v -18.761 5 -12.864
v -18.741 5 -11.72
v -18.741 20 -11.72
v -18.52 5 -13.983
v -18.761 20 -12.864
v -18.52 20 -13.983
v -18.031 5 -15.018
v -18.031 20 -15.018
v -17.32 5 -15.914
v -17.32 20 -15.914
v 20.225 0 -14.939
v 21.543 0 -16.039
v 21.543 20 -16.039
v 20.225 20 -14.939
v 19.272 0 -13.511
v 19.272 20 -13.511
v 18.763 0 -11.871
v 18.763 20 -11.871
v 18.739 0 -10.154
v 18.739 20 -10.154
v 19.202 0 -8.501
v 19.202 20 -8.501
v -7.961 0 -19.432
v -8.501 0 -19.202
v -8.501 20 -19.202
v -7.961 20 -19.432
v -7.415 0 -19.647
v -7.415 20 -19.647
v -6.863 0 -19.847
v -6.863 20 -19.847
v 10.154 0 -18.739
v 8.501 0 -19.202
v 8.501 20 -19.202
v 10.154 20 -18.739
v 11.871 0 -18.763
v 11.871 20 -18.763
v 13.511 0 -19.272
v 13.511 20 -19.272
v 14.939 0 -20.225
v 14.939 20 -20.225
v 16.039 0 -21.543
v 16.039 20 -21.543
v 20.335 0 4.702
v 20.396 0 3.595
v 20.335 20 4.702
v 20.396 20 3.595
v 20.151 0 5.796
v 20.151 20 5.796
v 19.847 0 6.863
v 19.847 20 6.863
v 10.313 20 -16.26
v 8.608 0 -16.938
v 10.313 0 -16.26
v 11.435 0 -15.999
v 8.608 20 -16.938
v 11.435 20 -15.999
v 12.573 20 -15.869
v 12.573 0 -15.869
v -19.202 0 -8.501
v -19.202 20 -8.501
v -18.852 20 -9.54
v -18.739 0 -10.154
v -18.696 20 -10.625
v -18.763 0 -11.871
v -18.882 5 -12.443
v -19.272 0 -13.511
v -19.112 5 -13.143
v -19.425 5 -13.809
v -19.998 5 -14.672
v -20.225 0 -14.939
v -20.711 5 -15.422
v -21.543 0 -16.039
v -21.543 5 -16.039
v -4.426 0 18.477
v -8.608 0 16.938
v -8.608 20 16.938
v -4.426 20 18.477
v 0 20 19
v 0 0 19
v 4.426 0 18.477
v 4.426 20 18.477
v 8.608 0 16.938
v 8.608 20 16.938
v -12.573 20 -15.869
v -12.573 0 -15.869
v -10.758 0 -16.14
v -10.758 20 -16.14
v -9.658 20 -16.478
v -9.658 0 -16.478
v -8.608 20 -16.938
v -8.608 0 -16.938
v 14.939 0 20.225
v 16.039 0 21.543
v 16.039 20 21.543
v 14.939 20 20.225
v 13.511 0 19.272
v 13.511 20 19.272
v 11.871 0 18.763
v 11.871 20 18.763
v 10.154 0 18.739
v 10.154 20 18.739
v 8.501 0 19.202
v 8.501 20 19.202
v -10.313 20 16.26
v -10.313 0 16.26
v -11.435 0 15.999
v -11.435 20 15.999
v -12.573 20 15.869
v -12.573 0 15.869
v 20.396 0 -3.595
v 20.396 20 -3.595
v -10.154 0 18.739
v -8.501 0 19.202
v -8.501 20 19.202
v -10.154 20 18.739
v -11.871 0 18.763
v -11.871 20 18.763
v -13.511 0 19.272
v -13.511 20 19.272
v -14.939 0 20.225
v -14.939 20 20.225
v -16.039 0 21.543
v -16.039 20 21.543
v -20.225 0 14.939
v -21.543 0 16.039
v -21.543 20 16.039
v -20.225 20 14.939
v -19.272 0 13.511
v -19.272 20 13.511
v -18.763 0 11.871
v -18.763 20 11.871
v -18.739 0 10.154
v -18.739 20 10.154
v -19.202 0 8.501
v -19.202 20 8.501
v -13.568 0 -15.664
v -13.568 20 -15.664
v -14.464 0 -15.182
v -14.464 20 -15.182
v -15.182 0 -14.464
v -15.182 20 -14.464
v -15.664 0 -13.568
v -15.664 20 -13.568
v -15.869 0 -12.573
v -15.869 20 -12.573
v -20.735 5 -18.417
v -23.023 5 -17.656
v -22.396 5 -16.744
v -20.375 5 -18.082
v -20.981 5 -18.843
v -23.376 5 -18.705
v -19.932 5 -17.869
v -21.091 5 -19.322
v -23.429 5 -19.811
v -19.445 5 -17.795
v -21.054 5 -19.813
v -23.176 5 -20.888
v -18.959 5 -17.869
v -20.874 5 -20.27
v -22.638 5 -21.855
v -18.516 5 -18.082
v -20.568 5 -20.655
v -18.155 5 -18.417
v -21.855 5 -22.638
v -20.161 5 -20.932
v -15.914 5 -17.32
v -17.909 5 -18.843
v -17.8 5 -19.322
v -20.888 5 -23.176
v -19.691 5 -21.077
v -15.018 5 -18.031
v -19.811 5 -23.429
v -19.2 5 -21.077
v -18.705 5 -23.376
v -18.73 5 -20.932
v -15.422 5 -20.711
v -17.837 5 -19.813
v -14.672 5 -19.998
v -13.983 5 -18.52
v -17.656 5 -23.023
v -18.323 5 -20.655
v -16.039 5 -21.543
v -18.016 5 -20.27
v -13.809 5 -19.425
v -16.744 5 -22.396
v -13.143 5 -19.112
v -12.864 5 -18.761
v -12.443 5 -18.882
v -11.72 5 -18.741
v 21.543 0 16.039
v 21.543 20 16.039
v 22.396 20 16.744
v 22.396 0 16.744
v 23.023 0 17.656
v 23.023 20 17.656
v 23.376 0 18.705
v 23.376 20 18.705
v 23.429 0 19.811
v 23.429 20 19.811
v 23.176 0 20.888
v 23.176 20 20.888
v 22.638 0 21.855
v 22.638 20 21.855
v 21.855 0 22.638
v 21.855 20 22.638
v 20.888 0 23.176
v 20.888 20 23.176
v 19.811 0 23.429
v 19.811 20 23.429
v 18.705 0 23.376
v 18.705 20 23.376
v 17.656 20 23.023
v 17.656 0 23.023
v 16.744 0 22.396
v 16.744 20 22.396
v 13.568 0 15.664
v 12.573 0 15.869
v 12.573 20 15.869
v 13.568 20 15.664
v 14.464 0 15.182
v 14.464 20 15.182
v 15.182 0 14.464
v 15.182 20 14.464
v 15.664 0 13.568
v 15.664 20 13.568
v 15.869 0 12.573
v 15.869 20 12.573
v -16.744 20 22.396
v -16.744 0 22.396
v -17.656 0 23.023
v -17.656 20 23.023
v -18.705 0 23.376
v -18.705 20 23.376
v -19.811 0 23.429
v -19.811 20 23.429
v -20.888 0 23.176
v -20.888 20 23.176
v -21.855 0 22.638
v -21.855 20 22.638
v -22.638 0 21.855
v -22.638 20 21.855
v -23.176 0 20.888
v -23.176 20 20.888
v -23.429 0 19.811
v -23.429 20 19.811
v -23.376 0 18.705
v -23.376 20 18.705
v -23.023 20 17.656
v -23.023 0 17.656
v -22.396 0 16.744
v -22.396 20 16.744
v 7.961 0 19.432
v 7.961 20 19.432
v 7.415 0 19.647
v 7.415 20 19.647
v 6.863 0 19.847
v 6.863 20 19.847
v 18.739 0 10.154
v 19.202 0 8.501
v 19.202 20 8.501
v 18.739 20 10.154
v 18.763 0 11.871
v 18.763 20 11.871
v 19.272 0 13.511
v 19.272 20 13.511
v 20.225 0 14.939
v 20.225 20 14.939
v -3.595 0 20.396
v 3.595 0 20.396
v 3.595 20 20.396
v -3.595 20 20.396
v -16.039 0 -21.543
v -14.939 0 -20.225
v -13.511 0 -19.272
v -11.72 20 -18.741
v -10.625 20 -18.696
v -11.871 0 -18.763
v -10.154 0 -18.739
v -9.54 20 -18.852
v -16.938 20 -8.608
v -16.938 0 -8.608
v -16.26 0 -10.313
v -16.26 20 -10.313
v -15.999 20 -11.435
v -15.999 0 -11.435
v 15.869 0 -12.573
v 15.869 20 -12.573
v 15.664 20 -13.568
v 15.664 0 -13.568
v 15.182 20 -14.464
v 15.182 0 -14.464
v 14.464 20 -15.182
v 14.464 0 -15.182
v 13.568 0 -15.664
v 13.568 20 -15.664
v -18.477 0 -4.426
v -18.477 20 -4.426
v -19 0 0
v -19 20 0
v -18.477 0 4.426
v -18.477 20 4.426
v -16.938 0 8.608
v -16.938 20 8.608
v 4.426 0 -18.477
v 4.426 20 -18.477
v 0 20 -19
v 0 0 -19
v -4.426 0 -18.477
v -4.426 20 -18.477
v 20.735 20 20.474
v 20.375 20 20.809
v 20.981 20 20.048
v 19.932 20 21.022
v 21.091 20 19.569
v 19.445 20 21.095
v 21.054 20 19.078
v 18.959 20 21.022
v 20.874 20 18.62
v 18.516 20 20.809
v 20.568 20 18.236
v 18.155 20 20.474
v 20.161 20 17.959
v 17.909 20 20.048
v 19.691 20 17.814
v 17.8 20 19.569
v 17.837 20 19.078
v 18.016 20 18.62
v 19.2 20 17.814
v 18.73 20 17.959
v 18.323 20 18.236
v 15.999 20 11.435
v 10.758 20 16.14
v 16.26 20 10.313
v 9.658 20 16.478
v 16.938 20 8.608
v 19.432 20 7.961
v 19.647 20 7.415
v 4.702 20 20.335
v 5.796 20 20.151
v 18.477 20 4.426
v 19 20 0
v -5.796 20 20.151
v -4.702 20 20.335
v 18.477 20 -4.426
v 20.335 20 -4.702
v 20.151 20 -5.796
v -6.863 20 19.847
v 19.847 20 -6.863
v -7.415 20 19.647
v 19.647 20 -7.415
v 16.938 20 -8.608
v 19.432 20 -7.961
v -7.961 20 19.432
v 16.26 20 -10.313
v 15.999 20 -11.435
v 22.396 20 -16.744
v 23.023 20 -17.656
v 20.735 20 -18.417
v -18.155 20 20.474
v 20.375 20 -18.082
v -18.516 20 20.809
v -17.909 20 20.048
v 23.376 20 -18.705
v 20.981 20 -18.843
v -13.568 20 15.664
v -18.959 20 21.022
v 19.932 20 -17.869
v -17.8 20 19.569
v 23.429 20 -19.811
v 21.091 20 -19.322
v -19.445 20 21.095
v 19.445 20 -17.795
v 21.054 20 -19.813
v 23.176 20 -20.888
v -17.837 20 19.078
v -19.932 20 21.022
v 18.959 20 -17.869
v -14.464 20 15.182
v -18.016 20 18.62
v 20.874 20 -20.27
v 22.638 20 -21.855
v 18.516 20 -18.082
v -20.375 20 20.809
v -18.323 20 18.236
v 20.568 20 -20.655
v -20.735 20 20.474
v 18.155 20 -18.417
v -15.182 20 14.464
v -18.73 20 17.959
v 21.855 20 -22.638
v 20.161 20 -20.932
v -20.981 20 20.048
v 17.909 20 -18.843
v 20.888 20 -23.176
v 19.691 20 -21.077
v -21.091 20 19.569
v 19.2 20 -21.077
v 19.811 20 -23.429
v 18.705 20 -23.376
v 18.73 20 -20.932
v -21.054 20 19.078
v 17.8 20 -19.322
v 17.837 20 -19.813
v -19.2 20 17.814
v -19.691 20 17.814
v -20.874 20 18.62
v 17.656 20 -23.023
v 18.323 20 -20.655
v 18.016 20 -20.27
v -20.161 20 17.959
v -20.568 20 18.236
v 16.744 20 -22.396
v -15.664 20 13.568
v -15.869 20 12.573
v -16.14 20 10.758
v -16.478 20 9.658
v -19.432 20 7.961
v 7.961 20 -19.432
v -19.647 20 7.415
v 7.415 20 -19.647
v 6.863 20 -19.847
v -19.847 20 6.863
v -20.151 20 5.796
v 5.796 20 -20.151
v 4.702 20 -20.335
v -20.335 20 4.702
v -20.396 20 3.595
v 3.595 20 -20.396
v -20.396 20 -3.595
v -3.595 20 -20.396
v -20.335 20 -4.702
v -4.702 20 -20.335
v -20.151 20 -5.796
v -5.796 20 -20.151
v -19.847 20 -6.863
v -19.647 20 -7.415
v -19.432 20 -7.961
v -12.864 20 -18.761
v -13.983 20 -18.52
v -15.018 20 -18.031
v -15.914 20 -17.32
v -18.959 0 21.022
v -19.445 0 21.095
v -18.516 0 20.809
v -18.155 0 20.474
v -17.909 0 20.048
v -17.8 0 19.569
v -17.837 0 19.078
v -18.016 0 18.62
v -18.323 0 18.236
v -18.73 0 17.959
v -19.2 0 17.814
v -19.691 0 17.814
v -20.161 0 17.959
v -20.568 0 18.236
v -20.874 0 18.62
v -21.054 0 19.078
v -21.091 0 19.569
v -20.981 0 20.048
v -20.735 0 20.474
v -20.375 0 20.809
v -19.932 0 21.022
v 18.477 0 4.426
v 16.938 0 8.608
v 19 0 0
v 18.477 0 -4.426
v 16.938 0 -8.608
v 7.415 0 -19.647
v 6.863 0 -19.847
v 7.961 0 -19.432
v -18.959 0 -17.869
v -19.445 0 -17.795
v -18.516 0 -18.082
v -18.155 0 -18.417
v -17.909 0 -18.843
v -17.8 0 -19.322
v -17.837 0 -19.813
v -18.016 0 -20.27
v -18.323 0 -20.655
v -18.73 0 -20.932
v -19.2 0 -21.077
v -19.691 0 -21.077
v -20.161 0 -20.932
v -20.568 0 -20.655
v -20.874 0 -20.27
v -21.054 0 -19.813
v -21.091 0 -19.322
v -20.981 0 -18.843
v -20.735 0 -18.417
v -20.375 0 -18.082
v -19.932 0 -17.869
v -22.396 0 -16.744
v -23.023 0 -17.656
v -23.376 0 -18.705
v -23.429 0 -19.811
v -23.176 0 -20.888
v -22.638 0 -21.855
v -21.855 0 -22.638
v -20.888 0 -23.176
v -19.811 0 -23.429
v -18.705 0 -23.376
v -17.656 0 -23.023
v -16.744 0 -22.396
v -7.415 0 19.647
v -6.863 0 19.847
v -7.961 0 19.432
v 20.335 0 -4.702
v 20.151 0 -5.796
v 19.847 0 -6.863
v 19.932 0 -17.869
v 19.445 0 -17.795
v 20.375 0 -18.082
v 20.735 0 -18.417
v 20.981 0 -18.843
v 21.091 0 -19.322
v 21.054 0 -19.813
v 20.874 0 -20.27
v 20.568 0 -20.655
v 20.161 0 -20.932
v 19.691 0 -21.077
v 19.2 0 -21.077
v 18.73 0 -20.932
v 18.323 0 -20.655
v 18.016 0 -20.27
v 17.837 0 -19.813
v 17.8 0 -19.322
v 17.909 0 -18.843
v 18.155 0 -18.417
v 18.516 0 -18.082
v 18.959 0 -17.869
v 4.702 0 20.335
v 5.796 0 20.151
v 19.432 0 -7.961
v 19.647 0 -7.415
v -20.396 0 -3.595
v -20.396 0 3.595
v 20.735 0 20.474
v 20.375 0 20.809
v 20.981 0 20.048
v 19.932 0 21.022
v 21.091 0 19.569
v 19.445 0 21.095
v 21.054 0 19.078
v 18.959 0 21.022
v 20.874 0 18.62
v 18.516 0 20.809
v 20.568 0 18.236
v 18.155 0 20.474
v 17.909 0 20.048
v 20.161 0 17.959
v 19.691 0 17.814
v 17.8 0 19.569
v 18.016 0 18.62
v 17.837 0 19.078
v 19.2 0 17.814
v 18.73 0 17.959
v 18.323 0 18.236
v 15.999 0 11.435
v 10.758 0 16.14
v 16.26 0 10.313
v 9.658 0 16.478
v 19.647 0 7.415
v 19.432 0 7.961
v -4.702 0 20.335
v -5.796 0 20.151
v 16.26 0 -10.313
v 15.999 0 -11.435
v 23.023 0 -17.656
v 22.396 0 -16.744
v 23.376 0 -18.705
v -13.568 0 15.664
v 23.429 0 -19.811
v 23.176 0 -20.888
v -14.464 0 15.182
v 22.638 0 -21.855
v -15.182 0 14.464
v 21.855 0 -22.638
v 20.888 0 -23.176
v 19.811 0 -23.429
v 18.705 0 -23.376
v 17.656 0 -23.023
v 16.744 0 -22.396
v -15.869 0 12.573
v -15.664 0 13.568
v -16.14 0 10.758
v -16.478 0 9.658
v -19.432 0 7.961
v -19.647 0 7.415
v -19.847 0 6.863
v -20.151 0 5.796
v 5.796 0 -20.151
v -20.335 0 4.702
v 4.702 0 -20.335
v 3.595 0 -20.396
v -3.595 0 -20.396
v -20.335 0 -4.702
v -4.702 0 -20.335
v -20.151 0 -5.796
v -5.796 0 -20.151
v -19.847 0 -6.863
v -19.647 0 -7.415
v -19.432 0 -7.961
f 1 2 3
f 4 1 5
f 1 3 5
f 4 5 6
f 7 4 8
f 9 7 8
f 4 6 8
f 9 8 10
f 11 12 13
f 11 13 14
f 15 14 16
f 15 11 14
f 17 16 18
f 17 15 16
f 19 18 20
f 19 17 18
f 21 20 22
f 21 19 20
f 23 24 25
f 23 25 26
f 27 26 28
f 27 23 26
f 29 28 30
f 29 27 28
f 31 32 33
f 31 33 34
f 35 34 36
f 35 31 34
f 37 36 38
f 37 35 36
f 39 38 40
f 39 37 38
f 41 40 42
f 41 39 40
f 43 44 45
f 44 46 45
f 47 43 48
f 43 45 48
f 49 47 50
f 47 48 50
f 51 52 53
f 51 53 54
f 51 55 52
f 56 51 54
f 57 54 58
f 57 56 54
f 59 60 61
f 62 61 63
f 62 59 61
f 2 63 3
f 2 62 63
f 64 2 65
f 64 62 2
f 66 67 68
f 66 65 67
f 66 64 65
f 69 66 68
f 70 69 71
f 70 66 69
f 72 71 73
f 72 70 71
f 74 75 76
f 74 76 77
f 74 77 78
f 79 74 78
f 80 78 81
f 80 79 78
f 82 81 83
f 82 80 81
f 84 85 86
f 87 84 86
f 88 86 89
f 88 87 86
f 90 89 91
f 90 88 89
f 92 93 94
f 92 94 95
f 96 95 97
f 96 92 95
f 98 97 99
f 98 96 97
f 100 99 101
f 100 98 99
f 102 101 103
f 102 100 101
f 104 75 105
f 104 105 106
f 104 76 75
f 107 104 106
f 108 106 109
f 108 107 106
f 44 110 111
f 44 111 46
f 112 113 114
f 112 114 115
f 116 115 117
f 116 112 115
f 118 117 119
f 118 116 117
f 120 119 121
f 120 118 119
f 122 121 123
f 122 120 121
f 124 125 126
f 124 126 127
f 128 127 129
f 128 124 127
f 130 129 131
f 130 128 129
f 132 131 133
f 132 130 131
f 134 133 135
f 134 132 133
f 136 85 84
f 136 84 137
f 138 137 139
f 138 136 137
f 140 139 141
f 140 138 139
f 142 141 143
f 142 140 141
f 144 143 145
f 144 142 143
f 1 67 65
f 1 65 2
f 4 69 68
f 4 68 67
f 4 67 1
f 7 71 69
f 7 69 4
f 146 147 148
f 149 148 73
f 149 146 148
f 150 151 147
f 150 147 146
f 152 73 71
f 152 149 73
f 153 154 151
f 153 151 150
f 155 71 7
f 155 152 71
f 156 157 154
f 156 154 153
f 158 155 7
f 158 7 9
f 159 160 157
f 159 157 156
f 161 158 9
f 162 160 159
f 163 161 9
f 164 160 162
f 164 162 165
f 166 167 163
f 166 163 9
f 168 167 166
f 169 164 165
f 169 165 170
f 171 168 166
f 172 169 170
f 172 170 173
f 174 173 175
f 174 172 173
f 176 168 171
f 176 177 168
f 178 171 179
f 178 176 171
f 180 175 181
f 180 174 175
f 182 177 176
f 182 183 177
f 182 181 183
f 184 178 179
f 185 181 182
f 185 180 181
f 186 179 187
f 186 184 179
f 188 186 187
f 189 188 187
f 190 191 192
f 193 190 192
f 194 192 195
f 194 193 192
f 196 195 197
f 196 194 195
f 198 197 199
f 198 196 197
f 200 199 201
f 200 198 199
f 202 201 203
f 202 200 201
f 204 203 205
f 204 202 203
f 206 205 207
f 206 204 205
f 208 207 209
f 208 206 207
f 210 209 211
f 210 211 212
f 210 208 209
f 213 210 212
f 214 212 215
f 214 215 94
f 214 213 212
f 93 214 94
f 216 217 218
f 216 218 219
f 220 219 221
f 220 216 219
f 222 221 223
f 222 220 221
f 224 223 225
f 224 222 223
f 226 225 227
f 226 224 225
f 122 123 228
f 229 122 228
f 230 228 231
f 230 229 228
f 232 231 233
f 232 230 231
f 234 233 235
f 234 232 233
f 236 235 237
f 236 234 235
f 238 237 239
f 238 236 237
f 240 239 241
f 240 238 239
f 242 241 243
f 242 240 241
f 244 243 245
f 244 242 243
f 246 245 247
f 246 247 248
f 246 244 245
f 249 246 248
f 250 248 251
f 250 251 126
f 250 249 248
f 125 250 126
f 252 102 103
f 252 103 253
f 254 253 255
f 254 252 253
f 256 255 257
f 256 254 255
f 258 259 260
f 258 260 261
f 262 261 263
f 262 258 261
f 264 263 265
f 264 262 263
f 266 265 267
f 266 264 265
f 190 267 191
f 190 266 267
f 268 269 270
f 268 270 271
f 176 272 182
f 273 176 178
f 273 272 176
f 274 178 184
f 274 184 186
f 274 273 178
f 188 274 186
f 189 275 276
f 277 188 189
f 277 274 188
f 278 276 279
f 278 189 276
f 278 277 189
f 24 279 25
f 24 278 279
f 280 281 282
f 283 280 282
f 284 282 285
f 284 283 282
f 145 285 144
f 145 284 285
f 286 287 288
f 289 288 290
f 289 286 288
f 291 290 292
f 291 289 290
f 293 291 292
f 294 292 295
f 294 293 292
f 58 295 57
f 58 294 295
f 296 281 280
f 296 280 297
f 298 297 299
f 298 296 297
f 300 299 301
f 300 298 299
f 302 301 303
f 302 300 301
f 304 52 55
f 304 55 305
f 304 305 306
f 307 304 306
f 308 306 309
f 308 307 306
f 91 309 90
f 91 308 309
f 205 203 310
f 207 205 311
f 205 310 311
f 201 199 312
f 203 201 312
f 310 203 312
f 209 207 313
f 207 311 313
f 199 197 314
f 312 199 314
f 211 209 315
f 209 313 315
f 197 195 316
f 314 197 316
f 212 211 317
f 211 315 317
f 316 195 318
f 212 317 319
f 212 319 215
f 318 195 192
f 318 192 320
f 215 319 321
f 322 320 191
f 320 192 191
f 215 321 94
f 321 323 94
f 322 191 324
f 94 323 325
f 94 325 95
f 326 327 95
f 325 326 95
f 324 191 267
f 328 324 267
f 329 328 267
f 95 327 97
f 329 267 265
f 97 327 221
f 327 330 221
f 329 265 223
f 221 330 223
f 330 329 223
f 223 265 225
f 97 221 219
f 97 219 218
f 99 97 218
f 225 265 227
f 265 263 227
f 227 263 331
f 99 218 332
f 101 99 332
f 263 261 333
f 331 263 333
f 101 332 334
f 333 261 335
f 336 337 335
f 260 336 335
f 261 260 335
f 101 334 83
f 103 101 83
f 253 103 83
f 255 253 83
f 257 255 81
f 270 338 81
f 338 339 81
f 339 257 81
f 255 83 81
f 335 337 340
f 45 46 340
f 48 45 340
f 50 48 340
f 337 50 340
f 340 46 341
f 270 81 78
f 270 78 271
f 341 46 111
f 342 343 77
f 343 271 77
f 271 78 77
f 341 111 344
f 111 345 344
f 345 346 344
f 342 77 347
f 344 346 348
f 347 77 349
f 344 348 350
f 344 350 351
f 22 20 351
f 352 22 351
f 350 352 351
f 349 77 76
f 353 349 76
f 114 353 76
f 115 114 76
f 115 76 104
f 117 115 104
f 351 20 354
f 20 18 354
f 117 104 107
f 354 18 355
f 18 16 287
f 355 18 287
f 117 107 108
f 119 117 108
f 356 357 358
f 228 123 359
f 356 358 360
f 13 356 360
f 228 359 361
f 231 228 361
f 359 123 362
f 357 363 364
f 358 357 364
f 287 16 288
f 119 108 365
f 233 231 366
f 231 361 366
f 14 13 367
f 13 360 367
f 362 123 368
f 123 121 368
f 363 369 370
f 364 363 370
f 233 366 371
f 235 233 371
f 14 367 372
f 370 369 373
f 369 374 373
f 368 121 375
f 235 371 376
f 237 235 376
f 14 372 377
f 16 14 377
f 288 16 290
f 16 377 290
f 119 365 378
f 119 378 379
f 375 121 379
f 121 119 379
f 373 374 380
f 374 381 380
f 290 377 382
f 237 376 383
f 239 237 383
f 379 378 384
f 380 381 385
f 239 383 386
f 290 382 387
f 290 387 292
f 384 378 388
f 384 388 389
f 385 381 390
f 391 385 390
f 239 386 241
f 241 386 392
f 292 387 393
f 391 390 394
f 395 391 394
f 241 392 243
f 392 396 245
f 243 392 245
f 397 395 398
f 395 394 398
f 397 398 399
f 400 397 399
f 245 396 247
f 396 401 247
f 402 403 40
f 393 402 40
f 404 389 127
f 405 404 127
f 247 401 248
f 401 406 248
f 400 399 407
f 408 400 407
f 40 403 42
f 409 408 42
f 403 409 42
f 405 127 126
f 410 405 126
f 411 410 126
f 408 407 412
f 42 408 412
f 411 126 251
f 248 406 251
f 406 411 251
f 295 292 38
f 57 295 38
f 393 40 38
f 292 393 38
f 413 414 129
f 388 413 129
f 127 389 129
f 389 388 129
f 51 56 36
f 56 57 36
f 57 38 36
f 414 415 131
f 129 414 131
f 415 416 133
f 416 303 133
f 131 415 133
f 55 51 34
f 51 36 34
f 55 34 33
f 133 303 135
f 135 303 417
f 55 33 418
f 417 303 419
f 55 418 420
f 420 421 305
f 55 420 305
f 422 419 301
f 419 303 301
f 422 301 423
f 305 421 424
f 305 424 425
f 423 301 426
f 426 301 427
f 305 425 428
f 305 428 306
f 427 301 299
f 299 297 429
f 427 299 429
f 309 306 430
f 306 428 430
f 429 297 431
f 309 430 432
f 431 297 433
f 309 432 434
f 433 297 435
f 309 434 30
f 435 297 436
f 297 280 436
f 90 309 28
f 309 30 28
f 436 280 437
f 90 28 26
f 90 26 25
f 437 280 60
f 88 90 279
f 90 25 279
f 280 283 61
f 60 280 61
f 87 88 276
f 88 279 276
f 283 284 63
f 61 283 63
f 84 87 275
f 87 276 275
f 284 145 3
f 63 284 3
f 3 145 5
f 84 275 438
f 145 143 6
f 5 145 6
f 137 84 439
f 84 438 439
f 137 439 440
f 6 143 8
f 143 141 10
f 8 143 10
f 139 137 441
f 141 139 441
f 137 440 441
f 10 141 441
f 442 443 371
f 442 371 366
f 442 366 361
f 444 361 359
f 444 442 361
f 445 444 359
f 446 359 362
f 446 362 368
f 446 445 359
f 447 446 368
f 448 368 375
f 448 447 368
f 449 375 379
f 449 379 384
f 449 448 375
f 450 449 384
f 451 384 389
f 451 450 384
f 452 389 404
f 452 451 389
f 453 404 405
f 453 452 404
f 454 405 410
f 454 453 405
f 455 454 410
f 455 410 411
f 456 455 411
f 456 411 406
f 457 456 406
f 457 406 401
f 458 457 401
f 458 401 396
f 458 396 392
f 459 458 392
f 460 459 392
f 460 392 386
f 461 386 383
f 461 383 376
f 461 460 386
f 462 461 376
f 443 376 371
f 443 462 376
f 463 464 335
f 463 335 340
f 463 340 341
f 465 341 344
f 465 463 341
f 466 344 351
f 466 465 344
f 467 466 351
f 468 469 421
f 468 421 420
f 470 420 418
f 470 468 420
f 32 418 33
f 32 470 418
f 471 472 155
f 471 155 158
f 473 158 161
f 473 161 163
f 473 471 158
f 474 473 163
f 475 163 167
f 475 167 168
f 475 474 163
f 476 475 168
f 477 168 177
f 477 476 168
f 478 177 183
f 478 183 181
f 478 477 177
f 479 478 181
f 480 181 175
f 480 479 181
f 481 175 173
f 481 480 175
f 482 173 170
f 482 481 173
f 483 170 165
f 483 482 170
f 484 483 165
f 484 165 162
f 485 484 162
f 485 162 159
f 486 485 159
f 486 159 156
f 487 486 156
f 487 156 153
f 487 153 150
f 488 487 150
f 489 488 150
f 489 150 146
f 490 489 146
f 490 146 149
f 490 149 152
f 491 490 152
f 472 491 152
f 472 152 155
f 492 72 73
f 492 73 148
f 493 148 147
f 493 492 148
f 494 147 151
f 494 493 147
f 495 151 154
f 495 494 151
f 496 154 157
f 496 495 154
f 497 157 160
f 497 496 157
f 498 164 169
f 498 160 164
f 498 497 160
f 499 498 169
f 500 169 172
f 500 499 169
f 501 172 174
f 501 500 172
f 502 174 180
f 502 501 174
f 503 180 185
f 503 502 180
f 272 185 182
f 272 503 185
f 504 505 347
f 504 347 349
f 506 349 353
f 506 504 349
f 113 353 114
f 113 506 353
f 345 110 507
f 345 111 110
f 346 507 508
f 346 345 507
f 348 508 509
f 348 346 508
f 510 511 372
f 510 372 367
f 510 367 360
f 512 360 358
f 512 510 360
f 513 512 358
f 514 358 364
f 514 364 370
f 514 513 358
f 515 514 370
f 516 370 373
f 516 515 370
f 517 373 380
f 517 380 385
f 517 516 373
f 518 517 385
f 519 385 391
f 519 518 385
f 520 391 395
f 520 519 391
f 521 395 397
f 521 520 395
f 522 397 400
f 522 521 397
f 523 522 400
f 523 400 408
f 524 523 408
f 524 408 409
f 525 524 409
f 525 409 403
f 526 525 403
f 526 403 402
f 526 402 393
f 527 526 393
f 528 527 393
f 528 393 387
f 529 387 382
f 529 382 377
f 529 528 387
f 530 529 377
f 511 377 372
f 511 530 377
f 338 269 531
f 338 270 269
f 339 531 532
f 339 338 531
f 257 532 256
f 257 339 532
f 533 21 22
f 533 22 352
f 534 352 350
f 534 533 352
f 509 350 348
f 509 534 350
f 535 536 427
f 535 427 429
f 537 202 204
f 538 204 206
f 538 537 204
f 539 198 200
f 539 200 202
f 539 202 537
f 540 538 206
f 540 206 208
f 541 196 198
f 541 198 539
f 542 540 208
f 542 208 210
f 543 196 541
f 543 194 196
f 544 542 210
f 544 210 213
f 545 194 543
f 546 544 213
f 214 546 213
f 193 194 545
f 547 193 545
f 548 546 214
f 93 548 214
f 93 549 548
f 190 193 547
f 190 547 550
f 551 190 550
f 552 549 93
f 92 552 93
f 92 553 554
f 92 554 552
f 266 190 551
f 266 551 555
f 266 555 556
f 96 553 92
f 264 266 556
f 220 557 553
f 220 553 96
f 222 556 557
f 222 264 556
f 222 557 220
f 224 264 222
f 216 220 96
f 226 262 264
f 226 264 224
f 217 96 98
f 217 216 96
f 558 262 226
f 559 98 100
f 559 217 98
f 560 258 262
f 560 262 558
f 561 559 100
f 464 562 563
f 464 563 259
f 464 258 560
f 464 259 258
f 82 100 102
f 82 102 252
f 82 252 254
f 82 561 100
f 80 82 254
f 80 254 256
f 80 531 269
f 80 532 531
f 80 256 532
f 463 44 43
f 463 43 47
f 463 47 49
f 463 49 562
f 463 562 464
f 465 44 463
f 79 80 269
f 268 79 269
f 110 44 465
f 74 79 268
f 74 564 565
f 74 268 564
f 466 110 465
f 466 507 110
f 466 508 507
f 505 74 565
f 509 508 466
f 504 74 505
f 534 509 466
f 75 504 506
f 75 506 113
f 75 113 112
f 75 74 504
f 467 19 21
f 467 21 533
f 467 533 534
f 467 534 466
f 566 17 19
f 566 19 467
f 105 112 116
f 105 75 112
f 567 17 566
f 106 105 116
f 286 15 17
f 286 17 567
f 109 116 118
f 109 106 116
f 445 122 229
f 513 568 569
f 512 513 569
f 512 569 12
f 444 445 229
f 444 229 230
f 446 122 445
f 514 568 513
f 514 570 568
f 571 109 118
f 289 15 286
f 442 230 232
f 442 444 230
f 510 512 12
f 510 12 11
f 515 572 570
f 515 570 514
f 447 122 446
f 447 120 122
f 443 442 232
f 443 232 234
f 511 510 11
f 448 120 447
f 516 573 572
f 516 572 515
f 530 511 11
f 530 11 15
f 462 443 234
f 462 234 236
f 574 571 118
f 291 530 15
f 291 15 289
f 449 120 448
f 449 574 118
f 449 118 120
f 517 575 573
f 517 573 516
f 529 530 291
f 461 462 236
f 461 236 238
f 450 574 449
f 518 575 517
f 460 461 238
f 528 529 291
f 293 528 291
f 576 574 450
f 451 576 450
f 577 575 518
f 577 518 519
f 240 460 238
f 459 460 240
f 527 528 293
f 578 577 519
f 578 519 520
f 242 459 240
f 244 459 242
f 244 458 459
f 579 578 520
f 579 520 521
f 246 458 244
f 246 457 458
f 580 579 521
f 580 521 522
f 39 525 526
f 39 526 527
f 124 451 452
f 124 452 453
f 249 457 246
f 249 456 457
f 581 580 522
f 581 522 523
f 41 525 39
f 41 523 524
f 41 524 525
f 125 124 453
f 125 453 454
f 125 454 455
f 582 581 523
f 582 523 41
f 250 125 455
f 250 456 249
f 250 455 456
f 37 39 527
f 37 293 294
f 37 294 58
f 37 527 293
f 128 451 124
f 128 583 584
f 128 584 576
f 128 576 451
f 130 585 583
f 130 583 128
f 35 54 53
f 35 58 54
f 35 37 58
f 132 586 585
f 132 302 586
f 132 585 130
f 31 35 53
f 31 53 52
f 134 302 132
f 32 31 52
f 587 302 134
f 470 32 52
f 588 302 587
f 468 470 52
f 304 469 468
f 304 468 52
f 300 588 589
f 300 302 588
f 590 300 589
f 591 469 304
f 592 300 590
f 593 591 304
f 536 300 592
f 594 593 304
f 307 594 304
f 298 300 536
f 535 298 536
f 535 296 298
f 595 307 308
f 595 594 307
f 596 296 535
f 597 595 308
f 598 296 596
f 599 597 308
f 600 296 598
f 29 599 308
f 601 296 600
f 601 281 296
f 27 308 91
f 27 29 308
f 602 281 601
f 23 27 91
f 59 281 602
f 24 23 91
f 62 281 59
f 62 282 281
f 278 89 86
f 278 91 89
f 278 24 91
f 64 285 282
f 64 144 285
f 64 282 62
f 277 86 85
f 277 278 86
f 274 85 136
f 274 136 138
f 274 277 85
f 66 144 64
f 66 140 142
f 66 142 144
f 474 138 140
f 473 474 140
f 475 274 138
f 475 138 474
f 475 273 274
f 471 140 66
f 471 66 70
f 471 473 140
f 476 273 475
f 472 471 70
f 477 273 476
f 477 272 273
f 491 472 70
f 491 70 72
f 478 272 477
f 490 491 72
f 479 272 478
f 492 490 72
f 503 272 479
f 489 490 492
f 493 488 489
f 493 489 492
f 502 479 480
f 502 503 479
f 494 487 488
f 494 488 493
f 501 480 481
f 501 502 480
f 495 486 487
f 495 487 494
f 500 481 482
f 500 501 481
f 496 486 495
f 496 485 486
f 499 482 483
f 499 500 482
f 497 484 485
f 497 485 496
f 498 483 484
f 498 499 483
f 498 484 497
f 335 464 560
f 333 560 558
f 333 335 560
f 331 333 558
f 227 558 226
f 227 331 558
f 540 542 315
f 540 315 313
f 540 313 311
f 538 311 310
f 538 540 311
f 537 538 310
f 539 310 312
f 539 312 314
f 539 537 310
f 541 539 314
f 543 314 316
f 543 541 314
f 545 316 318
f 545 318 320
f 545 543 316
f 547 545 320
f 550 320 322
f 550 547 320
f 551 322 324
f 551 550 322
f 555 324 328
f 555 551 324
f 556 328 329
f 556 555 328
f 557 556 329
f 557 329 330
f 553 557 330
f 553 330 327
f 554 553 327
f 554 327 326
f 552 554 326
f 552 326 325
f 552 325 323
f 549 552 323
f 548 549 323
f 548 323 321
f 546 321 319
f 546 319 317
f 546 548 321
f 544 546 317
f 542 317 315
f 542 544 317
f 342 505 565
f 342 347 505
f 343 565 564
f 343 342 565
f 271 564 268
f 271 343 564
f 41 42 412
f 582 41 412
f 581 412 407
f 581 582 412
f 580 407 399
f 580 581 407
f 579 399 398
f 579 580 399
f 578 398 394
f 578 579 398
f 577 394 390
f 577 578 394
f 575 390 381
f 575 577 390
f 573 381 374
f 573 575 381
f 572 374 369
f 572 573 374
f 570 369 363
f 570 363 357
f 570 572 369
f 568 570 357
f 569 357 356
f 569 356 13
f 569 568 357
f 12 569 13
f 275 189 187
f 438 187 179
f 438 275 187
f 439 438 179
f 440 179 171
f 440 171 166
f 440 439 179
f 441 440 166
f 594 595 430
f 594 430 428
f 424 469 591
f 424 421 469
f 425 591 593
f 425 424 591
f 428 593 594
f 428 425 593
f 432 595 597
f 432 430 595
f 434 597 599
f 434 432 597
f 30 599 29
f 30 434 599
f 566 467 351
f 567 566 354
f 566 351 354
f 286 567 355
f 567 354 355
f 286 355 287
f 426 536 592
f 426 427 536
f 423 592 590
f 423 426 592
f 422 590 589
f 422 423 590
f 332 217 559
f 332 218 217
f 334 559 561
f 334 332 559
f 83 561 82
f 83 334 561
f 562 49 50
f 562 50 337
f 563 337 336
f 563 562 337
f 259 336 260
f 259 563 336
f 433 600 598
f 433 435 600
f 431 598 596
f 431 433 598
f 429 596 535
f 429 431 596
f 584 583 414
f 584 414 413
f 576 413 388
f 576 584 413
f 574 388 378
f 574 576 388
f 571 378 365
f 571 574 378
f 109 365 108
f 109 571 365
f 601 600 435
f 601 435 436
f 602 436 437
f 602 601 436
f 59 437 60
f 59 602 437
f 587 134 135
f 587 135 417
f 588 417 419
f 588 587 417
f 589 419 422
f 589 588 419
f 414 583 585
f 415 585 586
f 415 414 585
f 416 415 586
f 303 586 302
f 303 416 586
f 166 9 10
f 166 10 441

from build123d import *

# Parameters (mm, degrees)
SKETCH_1_R          = 1.65
EXTRUDE_1_DEPTH     = 20
CUT_EXTRUDE_START   = -15
SKETCH_4_R          = 1.65
CUT_EXTRUDE_1_DEPTH = 15
FILLET_1_R          = 10
FILLET_2_R          = 5


with BuildPart() as part:
    # ｽｹｯﾁ1 → ﾎﾞｽ - 押し出し1 (new body)
    with BuildSketch(Plane(origin=(0, 0, 0), x_dir=(1, 0, 0), z_dir=(0, 1, 0))):
        with BuildLine():
            Line((20.396078054, 5), (20.396078054, -5))
            ThreePointArc((20.396078054, -5), (19.876430019, -6.776985295), (19.202290705, -8.501295883))
            ThreePointArc((19.202290705, -8.501295883), (18.958497792, -12.709351685), (21.542725681, -16.039356915))
            ThreePointArc((21.542725681, -16.039356915), (22.273863607, -22.273863607), (16.039356915, -21.542725681))
            ThreePointArc((16.039356915, -21.542725681), (12.709351685, -18.958497792), (8.501295883, -19.202290705))
            ThreePointArc((8.501295883, -19.202290705), (6.776985295, -19.876430019), (5, -20.396078054))
            Line((5, -20.396078054), (-5, -20.396078054))
            ThreePointArc((-5, -20.396078054), (-6.776985295, -19.876430019), (-8.501295883, -19.202290705))
            ThreePointArc((-8.501295883, -19.202290705), (-12.709351685, -18.958497792), (-16.039356915, -21.542725681))
            ThreePointArc((-16.039356915, -21.542725681), (-22.273863607, -22.273863607), (-21.542725681, -16.039356915))
            ThreePointArc((-21.542725681, -16.039356915), (-18.958497792, -12.709351685), (-19.202290705, -8.501295883))
            ThreePointArc((-19.202290705, -8.501295883), (-19.876430019, -6.776985295), (-20.396078054, -5))
            Line((-20.396078054, -5), (-20.396078054, 5))
            ThreePointArc((-20.396078054, 5), (-19.876430019, 6.776985295), (-19.202290705, 8.501295883))
            ThreePointArc((-19.202290705, 8.501295883), (-18.958497792, 12.709351685), (-21.542725681, 16.039356915))
            ThreePointArc((-21.542725681, 16.039356915), (-22.273863607, 22.273863607), (-16.039356915, 21.542725681))
            ThreePointArc((-16.039356915, 21.542725681), (-12.709351685, 18.958497792), (-8.501295883, 19.202290705))
            ThreePointArc((-8.501295883, 19.202290705), (-6.776985295, 19.876430019), (-5, 20.396078054))
            Line((-5, 20.396078054), (5, 20.396078054))
            ThreePointArc((5, 20.396078054), (6.776985295, 19.876430019), (8.501295883, 19.202290705))
            ThreePointArc((8.501295883, 19.202290705), (12.709351685, 18.958497792), (16.039356915, 21.542725681))
            ThreePointArc((16.039356915, 21.542725681), (22.273863607, 22.273863607), (21.542725681, 16.039356915))
            ThreePointArc((21.542725681, 16.039356915), (18.958497792, 12.709351685), (19.202290705, 8.501295883))
            ThreePointArc((19.202290705, 8.501295883), (19.876430019, 6.776985295), (20.396078054, 5))
        make_face()
        with Locations(Location((19.445436483, 19.445436483, 0), (0, 0, 270))):
            Circle(SKETCH_1_R, mode=Mode.SUBTRACT)
        with Locations(Location((19.445436483, -19.445436483, 0), (0, 0, 270))):
            Circle(SKETCH_1_R, mode=Mode.SUBTRACT)
        with Locations(Location((-19.445436483, -19.445436483, 0), (0, 0, 270))):
            Circle(SKETCH_1_R, mode=Mode.SUBTRACT)
        with Locations(Location((-19.445436483, 19.445436483, 0), (0, 0, 270))):
            Circle(SKETCH_1_R, mode=Mode.SUBTRACT)
        with BuildLine():
            ThreePointArc((10.911844504, 15.554152164), (0, 19), (-10.911844504, 15.554152164))
            ThreePointArc((-10.911844504, 15.554152164), (-14.849242405, 14.849242405), (-15.554152164, 10.911844504))
            ThreePointArc((-15.554152164, 10.911844504), (-19, 0), (-15.554152164, -10.911844504))
            ThreePointArc((-15.554152164, -10.911844504), (-14.849242405, -14.849242405), (-10.911844504, -15.554152164))
            ThreePointArc((-10.911844504, -15.554152164), (0, -19), (10.911844504, -15.554152164))
            ThreePointArc((10.911844504, -15.554152164), (14.849242405, -14.849242405), (15.554152164, -10.911844504))
            ThreePointArc((15.554152164, -10.911844504), (19, 0), (15.554152164, 10.911844504))
            ThreePointArc((15.554152164, 10.911844504), (14.849242405, 14.849242405), (10.911844504, 15.554152164))
        make_face(mode=Mode.SUBTRACT)
    extrude(amount=EXTRUDE_1_DEPTH)

    # ｽｹｯﾁ4 → ｶｯﾄ - 押し出し1 (cut)
    # profile 1 of 3: a face of its own
    with BuildSketch(Plane(origin=(0, 20, 0), x_dir=(1, 0, 0), z_dir=(0, 1, 0)).offset(CUT_EXTRUDE_START)):
        with BuildLine():
            ThreePointArc((-21.542725681, 16.039356915), (-20.338354704, 15.06240992), (-19.424600386, 13.80941833))
            Line((-19.424600386, 13.80941833), (-16.617009355, 16.617009361))
            ThreePointArc((-16.617009355, 16.617009361), (-18.979538151, 15.472661792), (-21.542725681, 16.039356915))
        make_face()
    # profile 2 of 3: a face of its own
    with BuildSketch(Plane(origin=(0, 20, 0), x_dir=(1, 0, 0), z_dir=(0, 1, 0)).offset(CUT_EXTRUDE_START)):
        with BuildLine():
            ThreePointArc((-21.542725681, 16.039356915), (-18.979538151, 15.472661792), (-16.617009355, 16.617009361))
            ThreePointArc((-16.617009355, 16.617009361), (-15.749918352, 17.914702755), (-15.445436483, 19.445436483))
            ThreePointArc((-15.445436483, 19.445436483), (-15.596779686, 20.535317607), (-16.039356915, 21.542725681))
            ThreePointArc((-16.039356915, 21.542725681), (-22.273863607, 22.273863607), (-21.542725681, 16.039356915))
        make_face()
        with Locations(Location((-19.445436483, 19.445436483, 0), (0, 0, 270))):
            Circle(SKETCH_4_R, mode=Mode.SUBTRACT)
    # profile 3 of 3: a face of its own
    with BuildSketch(Plane(origin=(0, 20, 0), x_dir=(1, 0, 0), z_dir=(0, 1, 0)).offset(CUT_EXTRUDE_START)):
        with BuildLine():
            ThreePointArc((-15.445436483, 19.445436483), (-15.749918352, 17.914702755), (-16.617009355, 16.617009361))
            Line((-16.617009355, 16.617009361), (-13.80941833, 19.424600386))
            ThreePointArc((-13.80941833, 19.424600386), (-15.06240992, 20.338354704), (-16.039356915, 21.542725681))
            ThreePointArc((-16.039356915, 21.542725681), (-15.596779686, 20.535317607), (-15.445436483, 19.445436483))
        make_face()
    extrude(amount=CUT_EXTRUDE_1_DEPTH, mode=Mode.SUBTRACT)

    # ﾌｨﾚｯﾄ1
    fillet_1_edges = [part.edges().sort_by_distance(p)[0] for p in [
        (20.396078054, 10, -5),
        (20.396078054, 10, 5),
        (5, 10, 20.396078054),
        (-5, 10, 20.396078054),
        (-20.396078054, 10, 5),
        (-20.396078054, 10, -5),
        (-5, 10, -20.396078054),
        (5, 10, -20.396078054),
        (15.554152164, 10, -10.911844504),
        (10.911844504, 10, -15.554152164),
        (-10.911844504, 10, -15.554152164),
        (-15.554152164, 10, -10.911844504),
        (-15.554152164, 10, 10.911844504),
        (-10.911844504, 10, 15.554152164),
        (10.911844504, 10, 15.554152164),
        (15.554152164, 10, 10.911844504),
    ]]
    fillet(fillet_1_edges, radius=FILLET_1_R)

    # ﾌｨﾚｯﾄ2
    fillet_2_edges = [part.edges().sort_by_distance(p)[0] for p in [
        (-13.80941833, 12.5, -19.424600386),
        (-19.424600386, 12.5, -13.80941833),
    ]]
    fillet(fillet_2_edges, radius=FILLET_2_R)


solid = part.part
